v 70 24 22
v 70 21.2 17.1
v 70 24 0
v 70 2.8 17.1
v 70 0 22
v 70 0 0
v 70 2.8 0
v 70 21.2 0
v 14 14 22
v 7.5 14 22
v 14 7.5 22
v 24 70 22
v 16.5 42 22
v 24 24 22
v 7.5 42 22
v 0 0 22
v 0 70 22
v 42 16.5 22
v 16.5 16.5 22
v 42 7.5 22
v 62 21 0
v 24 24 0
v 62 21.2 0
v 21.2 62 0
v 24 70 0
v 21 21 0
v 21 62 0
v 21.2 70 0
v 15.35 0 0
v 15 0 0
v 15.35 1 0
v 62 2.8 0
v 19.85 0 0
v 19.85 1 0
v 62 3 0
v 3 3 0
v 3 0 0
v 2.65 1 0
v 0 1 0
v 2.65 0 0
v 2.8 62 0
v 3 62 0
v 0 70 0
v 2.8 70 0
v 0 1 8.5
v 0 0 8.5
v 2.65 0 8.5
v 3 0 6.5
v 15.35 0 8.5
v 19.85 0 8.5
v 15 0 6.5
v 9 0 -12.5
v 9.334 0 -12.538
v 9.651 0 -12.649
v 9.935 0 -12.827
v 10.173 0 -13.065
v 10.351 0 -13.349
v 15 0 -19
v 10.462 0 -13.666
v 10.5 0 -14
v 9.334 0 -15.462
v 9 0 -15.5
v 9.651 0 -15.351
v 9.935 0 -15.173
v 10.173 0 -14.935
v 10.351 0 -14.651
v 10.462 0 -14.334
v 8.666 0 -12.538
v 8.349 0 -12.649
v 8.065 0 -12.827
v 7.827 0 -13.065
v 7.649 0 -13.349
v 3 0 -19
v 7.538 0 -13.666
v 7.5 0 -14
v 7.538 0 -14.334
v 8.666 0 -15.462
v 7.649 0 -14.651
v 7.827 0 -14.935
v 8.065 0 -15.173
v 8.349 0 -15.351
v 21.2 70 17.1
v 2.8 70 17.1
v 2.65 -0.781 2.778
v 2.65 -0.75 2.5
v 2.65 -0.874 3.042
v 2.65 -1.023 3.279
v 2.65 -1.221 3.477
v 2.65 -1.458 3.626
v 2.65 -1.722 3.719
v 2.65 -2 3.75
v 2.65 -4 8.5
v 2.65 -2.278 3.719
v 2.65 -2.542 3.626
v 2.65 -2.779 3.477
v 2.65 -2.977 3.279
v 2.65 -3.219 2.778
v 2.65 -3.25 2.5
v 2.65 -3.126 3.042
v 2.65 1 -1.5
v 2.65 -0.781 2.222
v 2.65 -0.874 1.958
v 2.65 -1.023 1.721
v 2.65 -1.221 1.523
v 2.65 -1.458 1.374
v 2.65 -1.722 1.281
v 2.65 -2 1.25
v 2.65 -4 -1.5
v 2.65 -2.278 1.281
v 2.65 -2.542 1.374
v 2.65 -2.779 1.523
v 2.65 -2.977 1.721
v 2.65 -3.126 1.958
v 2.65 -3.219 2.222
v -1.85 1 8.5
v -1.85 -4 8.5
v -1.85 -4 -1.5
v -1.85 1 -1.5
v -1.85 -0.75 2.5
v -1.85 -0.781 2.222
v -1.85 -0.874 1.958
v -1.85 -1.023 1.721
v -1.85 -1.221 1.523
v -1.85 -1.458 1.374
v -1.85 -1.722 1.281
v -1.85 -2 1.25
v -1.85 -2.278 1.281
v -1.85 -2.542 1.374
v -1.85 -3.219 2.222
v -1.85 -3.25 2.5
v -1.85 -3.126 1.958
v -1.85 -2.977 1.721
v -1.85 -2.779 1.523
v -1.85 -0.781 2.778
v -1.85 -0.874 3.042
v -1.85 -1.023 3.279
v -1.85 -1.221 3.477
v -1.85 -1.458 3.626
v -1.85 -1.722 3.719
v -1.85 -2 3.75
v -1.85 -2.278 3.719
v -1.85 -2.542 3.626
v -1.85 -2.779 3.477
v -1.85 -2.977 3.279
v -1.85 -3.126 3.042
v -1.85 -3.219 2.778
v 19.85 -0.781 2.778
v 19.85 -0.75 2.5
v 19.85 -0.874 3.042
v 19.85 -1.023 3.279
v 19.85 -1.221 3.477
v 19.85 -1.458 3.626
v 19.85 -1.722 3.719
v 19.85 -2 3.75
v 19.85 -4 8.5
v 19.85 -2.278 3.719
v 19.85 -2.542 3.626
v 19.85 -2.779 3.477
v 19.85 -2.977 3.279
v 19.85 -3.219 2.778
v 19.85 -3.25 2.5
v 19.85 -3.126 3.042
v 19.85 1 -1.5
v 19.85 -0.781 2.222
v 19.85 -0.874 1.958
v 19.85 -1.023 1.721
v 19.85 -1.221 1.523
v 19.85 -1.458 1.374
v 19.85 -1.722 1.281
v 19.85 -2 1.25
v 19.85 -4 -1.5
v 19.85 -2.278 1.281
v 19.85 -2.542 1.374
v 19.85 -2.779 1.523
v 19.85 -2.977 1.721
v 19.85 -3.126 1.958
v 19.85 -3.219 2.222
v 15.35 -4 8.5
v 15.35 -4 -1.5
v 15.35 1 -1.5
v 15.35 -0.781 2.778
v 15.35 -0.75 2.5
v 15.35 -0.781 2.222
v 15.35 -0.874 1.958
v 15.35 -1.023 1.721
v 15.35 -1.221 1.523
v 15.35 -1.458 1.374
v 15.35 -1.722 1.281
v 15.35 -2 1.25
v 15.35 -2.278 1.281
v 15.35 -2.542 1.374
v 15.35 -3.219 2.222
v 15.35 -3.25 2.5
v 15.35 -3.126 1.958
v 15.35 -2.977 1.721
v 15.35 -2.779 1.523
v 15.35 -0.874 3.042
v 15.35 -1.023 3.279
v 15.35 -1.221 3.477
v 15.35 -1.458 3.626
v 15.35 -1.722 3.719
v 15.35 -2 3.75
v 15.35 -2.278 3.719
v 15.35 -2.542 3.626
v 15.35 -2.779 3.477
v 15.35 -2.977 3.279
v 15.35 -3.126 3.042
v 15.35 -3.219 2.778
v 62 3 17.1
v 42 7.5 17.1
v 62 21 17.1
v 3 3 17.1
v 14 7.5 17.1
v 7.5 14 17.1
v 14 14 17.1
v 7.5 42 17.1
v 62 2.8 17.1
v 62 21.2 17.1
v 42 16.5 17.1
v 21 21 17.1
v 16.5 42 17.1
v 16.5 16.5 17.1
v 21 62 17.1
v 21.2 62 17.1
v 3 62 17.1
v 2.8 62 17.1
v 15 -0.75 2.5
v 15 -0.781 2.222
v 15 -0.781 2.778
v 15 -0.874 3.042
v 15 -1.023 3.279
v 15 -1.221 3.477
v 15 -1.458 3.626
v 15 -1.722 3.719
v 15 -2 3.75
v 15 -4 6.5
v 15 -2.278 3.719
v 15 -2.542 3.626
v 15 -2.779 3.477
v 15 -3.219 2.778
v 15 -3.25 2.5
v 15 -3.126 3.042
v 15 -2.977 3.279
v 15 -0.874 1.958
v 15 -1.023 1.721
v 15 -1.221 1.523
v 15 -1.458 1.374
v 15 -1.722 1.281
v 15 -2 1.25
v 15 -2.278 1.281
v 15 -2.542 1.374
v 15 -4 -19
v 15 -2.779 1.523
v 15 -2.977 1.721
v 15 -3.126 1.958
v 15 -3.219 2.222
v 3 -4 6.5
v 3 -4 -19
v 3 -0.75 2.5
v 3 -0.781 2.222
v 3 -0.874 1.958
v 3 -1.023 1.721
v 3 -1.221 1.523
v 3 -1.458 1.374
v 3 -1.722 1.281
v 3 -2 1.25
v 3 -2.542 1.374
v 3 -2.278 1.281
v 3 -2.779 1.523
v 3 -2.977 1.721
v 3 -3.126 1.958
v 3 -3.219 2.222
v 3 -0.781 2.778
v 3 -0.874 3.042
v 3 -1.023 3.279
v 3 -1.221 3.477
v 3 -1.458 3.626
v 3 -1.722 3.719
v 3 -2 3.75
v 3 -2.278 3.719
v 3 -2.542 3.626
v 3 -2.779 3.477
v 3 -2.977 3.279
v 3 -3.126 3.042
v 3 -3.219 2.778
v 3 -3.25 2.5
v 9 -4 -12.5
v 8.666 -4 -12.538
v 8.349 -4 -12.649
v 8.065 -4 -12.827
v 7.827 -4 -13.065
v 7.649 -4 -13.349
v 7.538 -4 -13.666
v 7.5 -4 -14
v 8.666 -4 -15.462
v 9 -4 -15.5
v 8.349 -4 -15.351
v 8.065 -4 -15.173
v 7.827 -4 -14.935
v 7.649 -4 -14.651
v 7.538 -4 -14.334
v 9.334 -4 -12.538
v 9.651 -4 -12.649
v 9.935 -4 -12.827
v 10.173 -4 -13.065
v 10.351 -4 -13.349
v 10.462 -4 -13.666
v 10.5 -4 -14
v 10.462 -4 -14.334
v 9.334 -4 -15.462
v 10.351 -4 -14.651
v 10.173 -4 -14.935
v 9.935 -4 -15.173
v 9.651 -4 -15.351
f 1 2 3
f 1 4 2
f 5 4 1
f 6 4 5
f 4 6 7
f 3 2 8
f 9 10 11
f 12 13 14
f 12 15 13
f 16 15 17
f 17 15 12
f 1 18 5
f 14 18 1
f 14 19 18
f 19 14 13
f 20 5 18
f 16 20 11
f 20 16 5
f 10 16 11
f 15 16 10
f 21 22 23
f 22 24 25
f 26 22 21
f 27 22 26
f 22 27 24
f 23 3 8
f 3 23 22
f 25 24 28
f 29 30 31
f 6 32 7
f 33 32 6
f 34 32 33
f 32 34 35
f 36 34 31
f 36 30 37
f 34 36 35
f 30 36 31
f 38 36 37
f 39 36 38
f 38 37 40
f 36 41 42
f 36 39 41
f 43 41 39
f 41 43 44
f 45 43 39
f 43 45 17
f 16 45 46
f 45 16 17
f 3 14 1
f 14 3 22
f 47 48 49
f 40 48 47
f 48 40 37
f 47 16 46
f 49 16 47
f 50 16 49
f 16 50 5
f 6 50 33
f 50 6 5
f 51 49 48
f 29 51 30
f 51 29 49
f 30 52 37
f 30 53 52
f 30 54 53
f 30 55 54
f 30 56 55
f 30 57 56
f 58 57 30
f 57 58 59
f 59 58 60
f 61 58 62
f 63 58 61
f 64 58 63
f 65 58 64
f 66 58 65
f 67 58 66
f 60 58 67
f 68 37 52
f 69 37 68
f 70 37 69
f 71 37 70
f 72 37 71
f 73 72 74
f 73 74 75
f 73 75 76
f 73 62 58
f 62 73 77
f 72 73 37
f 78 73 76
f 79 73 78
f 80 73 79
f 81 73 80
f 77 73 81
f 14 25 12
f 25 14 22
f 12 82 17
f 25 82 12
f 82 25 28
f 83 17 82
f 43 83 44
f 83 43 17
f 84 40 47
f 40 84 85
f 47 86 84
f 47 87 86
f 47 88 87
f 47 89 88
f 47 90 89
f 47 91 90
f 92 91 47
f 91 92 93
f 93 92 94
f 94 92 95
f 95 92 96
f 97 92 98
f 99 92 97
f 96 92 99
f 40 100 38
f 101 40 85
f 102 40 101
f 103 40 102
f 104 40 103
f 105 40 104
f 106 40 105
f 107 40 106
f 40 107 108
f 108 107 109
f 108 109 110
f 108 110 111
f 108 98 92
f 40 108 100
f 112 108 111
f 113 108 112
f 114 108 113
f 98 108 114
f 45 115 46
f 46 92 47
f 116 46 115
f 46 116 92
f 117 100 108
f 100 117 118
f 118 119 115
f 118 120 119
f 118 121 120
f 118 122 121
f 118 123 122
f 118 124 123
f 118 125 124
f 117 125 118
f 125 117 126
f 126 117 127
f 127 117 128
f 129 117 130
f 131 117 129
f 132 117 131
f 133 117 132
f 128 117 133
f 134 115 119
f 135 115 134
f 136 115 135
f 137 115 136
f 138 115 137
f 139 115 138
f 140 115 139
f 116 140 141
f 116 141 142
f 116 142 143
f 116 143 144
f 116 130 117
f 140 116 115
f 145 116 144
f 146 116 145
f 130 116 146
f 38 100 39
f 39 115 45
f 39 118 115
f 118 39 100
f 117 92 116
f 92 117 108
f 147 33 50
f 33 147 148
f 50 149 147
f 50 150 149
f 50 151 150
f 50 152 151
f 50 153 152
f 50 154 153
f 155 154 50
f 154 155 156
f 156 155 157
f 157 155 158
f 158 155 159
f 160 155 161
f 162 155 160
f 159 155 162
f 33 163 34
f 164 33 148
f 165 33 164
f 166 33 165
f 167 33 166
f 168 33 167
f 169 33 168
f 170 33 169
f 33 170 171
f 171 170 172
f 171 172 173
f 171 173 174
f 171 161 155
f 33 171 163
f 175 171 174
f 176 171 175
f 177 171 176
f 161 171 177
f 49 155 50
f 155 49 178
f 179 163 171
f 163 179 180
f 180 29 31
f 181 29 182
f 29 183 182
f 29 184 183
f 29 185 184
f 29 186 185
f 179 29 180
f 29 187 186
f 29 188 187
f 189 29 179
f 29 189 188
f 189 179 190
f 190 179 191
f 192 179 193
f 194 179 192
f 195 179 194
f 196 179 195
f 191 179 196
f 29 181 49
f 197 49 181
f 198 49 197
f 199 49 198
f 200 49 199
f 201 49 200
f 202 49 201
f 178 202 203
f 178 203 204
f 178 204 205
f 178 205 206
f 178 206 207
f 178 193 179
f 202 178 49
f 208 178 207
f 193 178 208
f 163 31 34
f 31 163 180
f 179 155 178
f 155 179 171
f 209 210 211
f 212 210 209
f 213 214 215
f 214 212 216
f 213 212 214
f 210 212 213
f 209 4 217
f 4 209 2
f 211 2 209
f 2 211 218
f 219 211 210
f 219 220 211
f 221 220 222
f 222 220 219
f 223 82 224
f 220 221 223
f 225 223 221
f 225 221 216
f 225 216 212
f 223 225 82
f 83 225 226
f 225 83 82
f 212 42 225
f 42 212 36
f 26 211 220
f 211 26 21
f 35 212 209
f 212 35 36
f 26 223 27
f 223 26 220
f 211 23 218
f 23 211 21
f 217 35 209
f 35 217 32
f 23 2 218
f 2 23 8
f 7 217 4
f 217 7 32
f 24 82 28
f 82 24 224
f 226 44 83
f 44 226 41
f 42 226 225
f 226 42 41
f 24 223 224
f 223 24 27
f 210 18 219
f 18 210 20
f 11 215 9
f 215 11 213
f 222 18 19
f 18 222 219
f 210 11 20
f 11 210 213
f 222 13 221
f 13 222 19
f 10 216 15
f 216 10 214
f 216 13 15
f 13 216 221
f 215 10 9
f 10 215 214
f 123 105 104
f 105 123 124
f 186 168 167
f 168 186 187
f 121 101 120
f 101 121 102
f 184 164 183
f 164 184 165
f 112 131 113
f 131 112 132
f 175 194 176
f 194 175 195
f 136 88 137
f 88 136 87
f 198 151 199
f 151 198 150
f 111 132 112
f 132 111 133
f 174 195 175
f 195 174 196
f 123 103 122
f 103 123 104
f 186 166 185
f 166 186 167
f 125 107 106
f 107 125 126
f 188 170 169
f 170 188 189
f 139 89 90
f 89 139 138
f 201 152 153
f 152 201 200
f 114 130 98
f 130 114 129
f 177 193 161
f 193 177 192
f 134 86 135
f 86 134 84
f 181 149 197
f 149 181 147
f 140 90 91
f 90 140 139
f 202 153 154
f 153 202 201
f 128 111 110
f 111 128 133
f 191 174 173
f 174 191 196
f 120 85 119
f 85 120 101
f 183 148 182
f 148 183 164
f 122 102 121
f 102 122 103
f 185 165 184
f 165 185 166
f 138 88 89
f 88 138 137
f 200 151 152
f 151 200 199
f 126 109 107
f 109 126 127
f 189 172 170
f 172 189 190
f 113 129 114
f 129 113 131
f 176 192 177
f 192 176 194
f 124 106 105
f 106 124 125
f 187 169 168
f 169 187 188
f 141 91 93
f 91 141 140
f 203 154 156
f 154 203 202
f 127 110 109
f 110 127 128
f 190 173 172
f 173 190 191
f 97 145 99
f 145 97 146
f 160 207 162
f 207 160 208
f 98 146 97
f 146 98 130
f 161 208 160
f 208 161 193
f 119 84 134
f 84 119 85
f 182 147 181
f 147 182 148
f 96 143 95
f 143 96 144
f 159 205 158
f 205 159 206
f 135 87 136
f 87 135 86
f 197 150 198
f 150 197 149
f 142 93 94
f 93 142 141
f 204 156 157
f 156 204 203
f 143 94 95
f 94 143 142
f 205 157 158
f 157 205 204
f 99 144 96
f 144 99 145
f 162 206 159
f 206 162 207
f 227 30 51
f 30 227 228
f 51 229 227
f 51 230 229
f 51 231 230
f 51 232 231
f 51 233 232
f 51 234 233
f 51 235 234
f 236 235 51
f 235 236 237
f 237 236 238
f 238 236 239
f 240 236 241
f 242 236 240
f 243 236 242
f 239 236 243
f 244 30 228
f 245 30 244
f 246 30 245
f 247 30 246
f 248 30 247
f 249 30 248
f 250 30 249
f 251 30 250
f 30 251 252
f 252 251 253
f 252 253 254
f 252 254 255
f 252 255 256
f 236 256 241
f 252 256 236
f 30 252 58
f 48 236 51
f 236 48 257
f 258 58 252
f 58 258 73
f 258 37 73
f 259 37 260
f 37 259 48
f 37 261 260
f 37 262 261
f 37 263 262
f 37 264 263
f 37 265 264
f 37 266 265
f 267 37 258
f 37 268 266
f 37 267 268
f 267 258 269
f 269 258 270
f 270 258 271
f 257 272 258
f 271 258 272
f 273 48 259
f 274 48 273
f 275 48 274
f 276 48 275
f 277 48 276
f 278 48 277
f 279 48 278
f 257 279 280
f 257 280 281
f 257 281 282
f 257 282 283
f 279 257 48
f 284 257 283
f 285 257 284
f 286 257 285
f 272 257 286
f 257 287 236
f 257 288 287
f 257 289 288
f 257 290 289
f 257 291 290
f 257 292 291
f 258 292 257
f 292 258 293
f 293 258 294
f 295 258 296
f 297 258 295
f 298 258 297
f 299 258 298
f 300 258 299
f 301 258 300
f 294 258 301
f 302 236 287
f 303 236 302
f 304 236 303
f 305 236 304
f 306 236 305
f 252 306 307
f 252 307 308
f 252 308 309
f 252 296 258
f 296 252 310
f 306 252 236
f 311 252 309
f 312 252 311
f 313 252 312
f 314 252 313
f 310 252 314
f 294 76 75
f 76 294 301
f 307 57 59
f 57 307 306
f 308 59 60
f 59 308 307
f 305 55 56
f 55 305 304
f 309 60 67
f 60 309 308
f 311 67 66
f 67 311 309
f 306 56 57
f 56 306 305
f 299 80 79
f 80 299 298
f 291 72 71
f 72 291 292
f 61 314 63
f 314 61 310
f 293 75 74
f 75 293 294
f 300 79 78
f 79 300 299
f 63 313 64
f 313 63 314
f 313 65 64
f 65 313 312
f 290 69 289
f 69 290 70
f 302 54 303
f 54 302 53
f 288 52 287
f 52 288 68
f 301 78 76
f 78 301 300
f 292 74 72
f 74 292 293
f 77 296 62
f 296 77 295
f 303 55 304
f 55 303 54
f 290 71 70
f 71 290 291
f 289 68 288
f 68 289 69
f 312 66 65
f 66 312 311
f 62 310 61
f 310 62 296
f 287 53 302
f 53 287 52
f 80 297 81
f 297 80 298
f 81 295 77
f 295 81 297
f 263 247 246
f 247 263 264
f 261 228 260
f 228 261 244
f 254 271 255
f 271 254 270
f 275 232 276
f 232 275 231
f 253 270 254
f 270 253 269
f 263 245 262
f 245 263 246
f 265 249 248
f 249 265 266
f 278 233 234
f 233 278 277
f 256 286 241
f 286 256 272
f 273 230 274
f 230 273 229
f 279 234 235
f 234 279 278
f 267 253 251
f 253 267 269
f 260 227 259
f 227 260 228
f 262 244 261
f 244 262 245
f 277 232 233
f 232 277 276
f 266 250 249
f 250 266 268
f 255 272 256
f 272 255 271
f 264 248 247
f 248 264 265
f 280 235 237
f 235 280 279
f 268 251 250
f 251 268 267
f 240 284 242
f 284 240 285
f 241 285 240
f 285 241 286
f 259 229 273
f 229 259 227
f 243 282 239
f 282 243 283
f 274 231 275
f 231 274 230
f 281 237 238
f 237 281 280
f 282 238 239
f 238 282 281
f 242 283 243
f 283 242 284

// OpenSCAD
// Gövde 70×22, et 3, kanal 18. Kulak iki yanak arasında. Vida Ø2.5.
// Kılavuz: kenardan 9, üstten 36, Ø3.

clamp = 18;
entry = 18.4;
wall = 3;
arm = 70;
h = 22;
top = 5;
drop = h - top;
mouth = 8;
hole_x = 9;
hole_from_top = 36;
hole_z = h - hole_from_top;
screw_r = 1.25;
guide_r = 1.5;
ear_w = 12;
ear_t = 4;
cheek_w = 4.5;
cheek_t = 4;
clear = 0.35;
ch = wall + clamp + wall;
screw_z = 2.5;
cheek_y0 = -cheek_t;
cheek_dy = cheek_t + 1;
ear_y = cheek_y0;
screw_y = cheek_y0 + cheek_t / 2;
left_x = hole_x - ear_w / 2 - clear - cheek_w;
right_x = hole_x + ear_w / 2 + clear;
ear_bot = hole_z - 5;
ear_top = screw_z + 4;

module body() {
  difference() {
    union() {
      cube([arm, ch, h]);
      cube([ch, arm, h]);
      translate([left_x, cheek_y0, screw_z - 4]) cube([cheek_w, cheek_dy, 10]);
      translate([right_x, cheek_y0, screw_z - 4]) cube([cheek_w, cheek_dy, 10]);
    }
    translate([wall, wall, -0.1]) cube([arm - wall + 1, clamp, drop + 0.2]);
    translate([wall, wall, -0.1]) cube([clamp, arm - wall + 1, drop + 0.2]);
    flare = (entry - clamp) / 2;
    translate([arm - mouth, wall - flare, -0.1]) cube([mouth + 1, entry, drop + 0.2]);
    translate([wall - flare, arm - mouth, -0.1]) cube([entry, mouth + 1, drop + 0.2]);
    win = 9;
    translate([14, wall + (clamp - win) / 2, drop - 1]) cube([28, win, top + 2]);
    translate([wall + (clamp - win) / 2, 14, drop - 1]) cube([win, 28, top + 2]);
    translate([(left_x + right_x + cheek_w) / 2, screw_y, screw_z])
      rotate([0, 90, 0]) cylinder(h = (right_x + cheek_w) - left_x + 2, r = screw_r, center = true, $fn = 28);
  }
}

module ear() {
  difference() {
    translate([hole_x - ear_w / 2, ear_y, ear_bot])
      cube([ear_w, ear_t, ear_top - ear_bot]);
    translate([hole_x, screw_y, hole_z])
      rotate([90, 0, 0]) cylinder(h = ear_t + 4, r = guide_r, center = true, $fn = 28);
    translate([hole_x, screw_y, screw_z])
      rotate([0, 90, 0]) cylinder(h = ear_w + 2, r = screw_r, center = true, $fn = 28);
  }
}

body();
ear();
